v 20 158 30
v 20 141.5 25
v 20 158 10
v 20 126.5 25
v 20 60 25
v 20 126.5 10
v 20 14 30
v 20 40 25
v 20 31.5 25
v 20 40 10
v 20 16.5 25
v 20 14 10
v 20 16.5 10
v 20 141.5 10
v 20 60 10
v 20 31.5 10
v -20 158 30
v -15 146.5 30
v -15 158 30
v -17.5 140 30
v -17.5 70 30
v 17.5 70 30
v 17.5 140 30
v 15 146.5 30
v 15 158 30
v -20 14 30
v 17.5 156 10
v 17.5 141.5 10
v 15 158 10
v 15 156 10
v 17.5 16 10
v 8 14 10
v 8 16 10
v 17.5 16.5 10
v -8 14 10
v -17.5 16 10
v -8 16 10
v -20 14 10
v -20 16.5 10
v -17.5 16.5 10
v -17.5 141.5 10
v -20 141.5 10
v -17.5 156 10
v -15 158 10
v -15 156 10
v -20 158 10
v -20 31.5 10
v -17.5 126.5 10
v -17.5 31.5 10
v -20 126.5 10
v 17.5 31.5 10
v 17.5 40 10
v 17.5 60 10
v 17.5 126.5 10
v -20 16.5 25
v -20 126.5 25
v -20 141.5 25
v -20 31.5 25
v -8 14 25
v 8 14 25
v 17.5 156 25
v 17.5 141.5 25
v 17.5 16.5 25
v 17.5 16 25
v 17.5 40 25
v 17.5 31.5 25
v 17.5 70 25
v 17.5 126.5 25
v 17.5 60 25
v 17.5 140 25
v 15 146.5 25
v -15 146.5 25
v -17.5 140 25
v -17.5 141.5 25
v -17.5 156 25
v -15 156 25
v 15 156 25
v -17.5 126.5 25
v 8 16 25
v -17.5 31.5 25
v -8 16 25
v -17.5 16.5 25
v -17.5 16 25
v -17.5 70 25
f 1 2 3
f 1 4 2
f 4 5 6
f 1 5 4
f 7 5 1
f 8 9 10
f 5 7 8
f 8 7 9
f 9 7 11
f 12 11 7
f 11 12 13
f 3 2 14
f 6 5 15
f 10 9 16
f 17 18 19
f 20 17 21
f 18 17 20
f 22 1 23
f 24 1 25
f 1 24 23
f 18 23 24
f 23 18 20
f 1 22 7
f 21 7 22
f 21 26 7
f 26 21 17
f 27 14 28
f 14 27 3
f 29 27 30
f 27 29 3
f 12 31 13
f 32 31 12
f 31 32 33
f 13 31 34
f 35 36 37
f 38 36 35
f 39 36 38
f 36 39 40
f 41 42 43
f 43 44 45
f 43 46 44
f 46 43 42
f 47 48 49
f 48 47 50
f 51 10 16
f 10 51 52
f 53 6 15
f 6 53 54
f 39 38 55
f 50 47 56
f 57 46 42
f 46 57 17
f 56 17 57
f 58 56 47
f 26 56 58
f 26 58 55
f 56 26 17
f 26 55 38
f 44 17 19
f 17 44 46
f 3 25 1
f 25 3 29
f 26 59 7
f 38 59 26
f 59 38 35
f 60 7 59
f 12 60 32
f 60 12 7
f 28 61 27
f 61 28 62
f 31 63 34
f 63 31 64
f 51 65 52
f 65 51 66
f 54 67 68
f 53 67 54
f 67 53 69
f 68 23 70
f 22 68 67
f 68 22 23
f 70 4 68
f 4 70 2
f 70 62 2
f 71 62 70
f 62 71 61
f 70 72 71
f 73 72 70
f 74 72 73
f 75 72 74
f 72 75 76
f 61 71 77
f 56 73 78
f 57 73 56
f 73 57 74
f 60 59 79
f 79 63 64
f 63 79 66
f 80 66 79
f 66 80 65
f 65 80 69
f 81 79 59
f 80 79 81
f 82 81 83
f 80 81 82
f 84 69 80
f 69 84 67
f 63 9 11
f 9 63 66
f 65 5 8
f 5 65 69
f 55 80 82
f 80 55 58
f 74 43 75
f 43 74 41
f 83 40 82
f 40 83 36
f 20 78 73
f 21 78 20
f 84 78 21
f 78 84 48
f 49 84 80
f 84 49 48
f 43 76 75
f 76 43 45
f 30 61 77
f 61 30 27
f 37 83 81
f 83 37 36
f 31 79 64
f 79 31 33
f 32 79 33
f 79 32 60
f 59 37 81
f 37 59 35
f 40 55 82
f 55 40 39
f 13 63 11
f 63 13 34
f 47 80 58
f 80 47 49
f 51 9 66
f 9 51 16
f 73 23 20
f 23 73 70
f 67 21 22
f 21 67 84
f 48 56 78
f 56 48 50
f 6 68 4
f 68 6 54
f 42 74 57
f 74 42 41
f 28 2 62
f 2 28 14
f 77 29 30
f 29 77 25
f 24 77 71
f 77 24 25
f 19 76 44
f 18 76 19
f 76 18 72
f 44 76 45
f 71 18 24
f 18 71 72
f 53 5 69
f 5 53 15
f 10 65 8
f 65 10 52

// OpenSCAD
////////////////////////////////////////////////
/////////////Open SCAD ////////////////////////
/*//////////////////////////////////////////////

date started  ///1.6.2017
date finished
modler @paradroid_
*/

/*

cylinder ([]) ;   sphere();  cube([]);
square ([]);  circle();

*/
///////////////////////////////////////////////

////////////////////////////////////////////////
////////////////////parameters//////////////////
////////////////////////////////////////////////
width_mainCube=40;
hight_mainCube=20;
length_mainCube =144;

width_negCube=35;
hight_negCube=20;
length_negCube=140;

width_negTragflaechen=15;
hight_negTragflaechen=200;
length_negTragflaechen=20;

width_negUSB=16;
hight_negUSB=3;
length_negUSB=20;

width_negScreen=35; 
hight_negScreen=70;
length_negScreen=10;

width_negInfra=30;
hight_negInfra=15;
length_negInfra=25;

width_negSwitch=4; 
hight_negSwitch=20;
length_negSwitch=16;
////////////////////////////////////////////////
/////////////////////renders////////////////////
///////////////////////////////////////////////

difference(){

 

mainCube(); 
  
negCube(); 
   negUSB(); 
   negTragflaechen(); //wings 
    negScreen(); // also LED and joystick 
  translate([0,110,0])
    negTragflaechen();  //wings
   negInfra(); // Infrared 
    negSwich();
}
////////////////////////////////////////////////
////////////////////modules////////////////////
///////////////////////////////////////////////
$fn = 50;

module mainCube(){
    translate([0,86,20])  
    cube([width_mainCube, length_mainCube, hight_mainCube], center=true);
       
}
module negCube(){
     translate([0,86,15]) 
     cube([width_negCube, length_negCube, hight_negCube], center=true);
}
module negTragflaechen(){
    rotate([0,0,270]){
        translate([-24,20,15]) 
        cube([width_negTragflaechen, hight_negTragflaechen, length_negTragflaechen],center=true);
 }
 }
 module negUSB(){
     translate([0,15,15]) 
     cube([width_negUSB, hight_negUSB, length_negUSB],center=true);
 }
 module negScreen(){
        translate([0,105,29]) 
     cube([width_negScreen, hight_negScreen, length_negScreen],center=true);
 }
 
 module negInfra(){
        translate([0,154,20]) 
     cube([width_negInfra, hight_negInfra, length_negInfra],center=true);
     
 }
 
  module negSwich(){
        translate([19,50,17]) 
     cube([width_negSwitch, hight_negSwitch, length_negSwitch],center=true);
 }
